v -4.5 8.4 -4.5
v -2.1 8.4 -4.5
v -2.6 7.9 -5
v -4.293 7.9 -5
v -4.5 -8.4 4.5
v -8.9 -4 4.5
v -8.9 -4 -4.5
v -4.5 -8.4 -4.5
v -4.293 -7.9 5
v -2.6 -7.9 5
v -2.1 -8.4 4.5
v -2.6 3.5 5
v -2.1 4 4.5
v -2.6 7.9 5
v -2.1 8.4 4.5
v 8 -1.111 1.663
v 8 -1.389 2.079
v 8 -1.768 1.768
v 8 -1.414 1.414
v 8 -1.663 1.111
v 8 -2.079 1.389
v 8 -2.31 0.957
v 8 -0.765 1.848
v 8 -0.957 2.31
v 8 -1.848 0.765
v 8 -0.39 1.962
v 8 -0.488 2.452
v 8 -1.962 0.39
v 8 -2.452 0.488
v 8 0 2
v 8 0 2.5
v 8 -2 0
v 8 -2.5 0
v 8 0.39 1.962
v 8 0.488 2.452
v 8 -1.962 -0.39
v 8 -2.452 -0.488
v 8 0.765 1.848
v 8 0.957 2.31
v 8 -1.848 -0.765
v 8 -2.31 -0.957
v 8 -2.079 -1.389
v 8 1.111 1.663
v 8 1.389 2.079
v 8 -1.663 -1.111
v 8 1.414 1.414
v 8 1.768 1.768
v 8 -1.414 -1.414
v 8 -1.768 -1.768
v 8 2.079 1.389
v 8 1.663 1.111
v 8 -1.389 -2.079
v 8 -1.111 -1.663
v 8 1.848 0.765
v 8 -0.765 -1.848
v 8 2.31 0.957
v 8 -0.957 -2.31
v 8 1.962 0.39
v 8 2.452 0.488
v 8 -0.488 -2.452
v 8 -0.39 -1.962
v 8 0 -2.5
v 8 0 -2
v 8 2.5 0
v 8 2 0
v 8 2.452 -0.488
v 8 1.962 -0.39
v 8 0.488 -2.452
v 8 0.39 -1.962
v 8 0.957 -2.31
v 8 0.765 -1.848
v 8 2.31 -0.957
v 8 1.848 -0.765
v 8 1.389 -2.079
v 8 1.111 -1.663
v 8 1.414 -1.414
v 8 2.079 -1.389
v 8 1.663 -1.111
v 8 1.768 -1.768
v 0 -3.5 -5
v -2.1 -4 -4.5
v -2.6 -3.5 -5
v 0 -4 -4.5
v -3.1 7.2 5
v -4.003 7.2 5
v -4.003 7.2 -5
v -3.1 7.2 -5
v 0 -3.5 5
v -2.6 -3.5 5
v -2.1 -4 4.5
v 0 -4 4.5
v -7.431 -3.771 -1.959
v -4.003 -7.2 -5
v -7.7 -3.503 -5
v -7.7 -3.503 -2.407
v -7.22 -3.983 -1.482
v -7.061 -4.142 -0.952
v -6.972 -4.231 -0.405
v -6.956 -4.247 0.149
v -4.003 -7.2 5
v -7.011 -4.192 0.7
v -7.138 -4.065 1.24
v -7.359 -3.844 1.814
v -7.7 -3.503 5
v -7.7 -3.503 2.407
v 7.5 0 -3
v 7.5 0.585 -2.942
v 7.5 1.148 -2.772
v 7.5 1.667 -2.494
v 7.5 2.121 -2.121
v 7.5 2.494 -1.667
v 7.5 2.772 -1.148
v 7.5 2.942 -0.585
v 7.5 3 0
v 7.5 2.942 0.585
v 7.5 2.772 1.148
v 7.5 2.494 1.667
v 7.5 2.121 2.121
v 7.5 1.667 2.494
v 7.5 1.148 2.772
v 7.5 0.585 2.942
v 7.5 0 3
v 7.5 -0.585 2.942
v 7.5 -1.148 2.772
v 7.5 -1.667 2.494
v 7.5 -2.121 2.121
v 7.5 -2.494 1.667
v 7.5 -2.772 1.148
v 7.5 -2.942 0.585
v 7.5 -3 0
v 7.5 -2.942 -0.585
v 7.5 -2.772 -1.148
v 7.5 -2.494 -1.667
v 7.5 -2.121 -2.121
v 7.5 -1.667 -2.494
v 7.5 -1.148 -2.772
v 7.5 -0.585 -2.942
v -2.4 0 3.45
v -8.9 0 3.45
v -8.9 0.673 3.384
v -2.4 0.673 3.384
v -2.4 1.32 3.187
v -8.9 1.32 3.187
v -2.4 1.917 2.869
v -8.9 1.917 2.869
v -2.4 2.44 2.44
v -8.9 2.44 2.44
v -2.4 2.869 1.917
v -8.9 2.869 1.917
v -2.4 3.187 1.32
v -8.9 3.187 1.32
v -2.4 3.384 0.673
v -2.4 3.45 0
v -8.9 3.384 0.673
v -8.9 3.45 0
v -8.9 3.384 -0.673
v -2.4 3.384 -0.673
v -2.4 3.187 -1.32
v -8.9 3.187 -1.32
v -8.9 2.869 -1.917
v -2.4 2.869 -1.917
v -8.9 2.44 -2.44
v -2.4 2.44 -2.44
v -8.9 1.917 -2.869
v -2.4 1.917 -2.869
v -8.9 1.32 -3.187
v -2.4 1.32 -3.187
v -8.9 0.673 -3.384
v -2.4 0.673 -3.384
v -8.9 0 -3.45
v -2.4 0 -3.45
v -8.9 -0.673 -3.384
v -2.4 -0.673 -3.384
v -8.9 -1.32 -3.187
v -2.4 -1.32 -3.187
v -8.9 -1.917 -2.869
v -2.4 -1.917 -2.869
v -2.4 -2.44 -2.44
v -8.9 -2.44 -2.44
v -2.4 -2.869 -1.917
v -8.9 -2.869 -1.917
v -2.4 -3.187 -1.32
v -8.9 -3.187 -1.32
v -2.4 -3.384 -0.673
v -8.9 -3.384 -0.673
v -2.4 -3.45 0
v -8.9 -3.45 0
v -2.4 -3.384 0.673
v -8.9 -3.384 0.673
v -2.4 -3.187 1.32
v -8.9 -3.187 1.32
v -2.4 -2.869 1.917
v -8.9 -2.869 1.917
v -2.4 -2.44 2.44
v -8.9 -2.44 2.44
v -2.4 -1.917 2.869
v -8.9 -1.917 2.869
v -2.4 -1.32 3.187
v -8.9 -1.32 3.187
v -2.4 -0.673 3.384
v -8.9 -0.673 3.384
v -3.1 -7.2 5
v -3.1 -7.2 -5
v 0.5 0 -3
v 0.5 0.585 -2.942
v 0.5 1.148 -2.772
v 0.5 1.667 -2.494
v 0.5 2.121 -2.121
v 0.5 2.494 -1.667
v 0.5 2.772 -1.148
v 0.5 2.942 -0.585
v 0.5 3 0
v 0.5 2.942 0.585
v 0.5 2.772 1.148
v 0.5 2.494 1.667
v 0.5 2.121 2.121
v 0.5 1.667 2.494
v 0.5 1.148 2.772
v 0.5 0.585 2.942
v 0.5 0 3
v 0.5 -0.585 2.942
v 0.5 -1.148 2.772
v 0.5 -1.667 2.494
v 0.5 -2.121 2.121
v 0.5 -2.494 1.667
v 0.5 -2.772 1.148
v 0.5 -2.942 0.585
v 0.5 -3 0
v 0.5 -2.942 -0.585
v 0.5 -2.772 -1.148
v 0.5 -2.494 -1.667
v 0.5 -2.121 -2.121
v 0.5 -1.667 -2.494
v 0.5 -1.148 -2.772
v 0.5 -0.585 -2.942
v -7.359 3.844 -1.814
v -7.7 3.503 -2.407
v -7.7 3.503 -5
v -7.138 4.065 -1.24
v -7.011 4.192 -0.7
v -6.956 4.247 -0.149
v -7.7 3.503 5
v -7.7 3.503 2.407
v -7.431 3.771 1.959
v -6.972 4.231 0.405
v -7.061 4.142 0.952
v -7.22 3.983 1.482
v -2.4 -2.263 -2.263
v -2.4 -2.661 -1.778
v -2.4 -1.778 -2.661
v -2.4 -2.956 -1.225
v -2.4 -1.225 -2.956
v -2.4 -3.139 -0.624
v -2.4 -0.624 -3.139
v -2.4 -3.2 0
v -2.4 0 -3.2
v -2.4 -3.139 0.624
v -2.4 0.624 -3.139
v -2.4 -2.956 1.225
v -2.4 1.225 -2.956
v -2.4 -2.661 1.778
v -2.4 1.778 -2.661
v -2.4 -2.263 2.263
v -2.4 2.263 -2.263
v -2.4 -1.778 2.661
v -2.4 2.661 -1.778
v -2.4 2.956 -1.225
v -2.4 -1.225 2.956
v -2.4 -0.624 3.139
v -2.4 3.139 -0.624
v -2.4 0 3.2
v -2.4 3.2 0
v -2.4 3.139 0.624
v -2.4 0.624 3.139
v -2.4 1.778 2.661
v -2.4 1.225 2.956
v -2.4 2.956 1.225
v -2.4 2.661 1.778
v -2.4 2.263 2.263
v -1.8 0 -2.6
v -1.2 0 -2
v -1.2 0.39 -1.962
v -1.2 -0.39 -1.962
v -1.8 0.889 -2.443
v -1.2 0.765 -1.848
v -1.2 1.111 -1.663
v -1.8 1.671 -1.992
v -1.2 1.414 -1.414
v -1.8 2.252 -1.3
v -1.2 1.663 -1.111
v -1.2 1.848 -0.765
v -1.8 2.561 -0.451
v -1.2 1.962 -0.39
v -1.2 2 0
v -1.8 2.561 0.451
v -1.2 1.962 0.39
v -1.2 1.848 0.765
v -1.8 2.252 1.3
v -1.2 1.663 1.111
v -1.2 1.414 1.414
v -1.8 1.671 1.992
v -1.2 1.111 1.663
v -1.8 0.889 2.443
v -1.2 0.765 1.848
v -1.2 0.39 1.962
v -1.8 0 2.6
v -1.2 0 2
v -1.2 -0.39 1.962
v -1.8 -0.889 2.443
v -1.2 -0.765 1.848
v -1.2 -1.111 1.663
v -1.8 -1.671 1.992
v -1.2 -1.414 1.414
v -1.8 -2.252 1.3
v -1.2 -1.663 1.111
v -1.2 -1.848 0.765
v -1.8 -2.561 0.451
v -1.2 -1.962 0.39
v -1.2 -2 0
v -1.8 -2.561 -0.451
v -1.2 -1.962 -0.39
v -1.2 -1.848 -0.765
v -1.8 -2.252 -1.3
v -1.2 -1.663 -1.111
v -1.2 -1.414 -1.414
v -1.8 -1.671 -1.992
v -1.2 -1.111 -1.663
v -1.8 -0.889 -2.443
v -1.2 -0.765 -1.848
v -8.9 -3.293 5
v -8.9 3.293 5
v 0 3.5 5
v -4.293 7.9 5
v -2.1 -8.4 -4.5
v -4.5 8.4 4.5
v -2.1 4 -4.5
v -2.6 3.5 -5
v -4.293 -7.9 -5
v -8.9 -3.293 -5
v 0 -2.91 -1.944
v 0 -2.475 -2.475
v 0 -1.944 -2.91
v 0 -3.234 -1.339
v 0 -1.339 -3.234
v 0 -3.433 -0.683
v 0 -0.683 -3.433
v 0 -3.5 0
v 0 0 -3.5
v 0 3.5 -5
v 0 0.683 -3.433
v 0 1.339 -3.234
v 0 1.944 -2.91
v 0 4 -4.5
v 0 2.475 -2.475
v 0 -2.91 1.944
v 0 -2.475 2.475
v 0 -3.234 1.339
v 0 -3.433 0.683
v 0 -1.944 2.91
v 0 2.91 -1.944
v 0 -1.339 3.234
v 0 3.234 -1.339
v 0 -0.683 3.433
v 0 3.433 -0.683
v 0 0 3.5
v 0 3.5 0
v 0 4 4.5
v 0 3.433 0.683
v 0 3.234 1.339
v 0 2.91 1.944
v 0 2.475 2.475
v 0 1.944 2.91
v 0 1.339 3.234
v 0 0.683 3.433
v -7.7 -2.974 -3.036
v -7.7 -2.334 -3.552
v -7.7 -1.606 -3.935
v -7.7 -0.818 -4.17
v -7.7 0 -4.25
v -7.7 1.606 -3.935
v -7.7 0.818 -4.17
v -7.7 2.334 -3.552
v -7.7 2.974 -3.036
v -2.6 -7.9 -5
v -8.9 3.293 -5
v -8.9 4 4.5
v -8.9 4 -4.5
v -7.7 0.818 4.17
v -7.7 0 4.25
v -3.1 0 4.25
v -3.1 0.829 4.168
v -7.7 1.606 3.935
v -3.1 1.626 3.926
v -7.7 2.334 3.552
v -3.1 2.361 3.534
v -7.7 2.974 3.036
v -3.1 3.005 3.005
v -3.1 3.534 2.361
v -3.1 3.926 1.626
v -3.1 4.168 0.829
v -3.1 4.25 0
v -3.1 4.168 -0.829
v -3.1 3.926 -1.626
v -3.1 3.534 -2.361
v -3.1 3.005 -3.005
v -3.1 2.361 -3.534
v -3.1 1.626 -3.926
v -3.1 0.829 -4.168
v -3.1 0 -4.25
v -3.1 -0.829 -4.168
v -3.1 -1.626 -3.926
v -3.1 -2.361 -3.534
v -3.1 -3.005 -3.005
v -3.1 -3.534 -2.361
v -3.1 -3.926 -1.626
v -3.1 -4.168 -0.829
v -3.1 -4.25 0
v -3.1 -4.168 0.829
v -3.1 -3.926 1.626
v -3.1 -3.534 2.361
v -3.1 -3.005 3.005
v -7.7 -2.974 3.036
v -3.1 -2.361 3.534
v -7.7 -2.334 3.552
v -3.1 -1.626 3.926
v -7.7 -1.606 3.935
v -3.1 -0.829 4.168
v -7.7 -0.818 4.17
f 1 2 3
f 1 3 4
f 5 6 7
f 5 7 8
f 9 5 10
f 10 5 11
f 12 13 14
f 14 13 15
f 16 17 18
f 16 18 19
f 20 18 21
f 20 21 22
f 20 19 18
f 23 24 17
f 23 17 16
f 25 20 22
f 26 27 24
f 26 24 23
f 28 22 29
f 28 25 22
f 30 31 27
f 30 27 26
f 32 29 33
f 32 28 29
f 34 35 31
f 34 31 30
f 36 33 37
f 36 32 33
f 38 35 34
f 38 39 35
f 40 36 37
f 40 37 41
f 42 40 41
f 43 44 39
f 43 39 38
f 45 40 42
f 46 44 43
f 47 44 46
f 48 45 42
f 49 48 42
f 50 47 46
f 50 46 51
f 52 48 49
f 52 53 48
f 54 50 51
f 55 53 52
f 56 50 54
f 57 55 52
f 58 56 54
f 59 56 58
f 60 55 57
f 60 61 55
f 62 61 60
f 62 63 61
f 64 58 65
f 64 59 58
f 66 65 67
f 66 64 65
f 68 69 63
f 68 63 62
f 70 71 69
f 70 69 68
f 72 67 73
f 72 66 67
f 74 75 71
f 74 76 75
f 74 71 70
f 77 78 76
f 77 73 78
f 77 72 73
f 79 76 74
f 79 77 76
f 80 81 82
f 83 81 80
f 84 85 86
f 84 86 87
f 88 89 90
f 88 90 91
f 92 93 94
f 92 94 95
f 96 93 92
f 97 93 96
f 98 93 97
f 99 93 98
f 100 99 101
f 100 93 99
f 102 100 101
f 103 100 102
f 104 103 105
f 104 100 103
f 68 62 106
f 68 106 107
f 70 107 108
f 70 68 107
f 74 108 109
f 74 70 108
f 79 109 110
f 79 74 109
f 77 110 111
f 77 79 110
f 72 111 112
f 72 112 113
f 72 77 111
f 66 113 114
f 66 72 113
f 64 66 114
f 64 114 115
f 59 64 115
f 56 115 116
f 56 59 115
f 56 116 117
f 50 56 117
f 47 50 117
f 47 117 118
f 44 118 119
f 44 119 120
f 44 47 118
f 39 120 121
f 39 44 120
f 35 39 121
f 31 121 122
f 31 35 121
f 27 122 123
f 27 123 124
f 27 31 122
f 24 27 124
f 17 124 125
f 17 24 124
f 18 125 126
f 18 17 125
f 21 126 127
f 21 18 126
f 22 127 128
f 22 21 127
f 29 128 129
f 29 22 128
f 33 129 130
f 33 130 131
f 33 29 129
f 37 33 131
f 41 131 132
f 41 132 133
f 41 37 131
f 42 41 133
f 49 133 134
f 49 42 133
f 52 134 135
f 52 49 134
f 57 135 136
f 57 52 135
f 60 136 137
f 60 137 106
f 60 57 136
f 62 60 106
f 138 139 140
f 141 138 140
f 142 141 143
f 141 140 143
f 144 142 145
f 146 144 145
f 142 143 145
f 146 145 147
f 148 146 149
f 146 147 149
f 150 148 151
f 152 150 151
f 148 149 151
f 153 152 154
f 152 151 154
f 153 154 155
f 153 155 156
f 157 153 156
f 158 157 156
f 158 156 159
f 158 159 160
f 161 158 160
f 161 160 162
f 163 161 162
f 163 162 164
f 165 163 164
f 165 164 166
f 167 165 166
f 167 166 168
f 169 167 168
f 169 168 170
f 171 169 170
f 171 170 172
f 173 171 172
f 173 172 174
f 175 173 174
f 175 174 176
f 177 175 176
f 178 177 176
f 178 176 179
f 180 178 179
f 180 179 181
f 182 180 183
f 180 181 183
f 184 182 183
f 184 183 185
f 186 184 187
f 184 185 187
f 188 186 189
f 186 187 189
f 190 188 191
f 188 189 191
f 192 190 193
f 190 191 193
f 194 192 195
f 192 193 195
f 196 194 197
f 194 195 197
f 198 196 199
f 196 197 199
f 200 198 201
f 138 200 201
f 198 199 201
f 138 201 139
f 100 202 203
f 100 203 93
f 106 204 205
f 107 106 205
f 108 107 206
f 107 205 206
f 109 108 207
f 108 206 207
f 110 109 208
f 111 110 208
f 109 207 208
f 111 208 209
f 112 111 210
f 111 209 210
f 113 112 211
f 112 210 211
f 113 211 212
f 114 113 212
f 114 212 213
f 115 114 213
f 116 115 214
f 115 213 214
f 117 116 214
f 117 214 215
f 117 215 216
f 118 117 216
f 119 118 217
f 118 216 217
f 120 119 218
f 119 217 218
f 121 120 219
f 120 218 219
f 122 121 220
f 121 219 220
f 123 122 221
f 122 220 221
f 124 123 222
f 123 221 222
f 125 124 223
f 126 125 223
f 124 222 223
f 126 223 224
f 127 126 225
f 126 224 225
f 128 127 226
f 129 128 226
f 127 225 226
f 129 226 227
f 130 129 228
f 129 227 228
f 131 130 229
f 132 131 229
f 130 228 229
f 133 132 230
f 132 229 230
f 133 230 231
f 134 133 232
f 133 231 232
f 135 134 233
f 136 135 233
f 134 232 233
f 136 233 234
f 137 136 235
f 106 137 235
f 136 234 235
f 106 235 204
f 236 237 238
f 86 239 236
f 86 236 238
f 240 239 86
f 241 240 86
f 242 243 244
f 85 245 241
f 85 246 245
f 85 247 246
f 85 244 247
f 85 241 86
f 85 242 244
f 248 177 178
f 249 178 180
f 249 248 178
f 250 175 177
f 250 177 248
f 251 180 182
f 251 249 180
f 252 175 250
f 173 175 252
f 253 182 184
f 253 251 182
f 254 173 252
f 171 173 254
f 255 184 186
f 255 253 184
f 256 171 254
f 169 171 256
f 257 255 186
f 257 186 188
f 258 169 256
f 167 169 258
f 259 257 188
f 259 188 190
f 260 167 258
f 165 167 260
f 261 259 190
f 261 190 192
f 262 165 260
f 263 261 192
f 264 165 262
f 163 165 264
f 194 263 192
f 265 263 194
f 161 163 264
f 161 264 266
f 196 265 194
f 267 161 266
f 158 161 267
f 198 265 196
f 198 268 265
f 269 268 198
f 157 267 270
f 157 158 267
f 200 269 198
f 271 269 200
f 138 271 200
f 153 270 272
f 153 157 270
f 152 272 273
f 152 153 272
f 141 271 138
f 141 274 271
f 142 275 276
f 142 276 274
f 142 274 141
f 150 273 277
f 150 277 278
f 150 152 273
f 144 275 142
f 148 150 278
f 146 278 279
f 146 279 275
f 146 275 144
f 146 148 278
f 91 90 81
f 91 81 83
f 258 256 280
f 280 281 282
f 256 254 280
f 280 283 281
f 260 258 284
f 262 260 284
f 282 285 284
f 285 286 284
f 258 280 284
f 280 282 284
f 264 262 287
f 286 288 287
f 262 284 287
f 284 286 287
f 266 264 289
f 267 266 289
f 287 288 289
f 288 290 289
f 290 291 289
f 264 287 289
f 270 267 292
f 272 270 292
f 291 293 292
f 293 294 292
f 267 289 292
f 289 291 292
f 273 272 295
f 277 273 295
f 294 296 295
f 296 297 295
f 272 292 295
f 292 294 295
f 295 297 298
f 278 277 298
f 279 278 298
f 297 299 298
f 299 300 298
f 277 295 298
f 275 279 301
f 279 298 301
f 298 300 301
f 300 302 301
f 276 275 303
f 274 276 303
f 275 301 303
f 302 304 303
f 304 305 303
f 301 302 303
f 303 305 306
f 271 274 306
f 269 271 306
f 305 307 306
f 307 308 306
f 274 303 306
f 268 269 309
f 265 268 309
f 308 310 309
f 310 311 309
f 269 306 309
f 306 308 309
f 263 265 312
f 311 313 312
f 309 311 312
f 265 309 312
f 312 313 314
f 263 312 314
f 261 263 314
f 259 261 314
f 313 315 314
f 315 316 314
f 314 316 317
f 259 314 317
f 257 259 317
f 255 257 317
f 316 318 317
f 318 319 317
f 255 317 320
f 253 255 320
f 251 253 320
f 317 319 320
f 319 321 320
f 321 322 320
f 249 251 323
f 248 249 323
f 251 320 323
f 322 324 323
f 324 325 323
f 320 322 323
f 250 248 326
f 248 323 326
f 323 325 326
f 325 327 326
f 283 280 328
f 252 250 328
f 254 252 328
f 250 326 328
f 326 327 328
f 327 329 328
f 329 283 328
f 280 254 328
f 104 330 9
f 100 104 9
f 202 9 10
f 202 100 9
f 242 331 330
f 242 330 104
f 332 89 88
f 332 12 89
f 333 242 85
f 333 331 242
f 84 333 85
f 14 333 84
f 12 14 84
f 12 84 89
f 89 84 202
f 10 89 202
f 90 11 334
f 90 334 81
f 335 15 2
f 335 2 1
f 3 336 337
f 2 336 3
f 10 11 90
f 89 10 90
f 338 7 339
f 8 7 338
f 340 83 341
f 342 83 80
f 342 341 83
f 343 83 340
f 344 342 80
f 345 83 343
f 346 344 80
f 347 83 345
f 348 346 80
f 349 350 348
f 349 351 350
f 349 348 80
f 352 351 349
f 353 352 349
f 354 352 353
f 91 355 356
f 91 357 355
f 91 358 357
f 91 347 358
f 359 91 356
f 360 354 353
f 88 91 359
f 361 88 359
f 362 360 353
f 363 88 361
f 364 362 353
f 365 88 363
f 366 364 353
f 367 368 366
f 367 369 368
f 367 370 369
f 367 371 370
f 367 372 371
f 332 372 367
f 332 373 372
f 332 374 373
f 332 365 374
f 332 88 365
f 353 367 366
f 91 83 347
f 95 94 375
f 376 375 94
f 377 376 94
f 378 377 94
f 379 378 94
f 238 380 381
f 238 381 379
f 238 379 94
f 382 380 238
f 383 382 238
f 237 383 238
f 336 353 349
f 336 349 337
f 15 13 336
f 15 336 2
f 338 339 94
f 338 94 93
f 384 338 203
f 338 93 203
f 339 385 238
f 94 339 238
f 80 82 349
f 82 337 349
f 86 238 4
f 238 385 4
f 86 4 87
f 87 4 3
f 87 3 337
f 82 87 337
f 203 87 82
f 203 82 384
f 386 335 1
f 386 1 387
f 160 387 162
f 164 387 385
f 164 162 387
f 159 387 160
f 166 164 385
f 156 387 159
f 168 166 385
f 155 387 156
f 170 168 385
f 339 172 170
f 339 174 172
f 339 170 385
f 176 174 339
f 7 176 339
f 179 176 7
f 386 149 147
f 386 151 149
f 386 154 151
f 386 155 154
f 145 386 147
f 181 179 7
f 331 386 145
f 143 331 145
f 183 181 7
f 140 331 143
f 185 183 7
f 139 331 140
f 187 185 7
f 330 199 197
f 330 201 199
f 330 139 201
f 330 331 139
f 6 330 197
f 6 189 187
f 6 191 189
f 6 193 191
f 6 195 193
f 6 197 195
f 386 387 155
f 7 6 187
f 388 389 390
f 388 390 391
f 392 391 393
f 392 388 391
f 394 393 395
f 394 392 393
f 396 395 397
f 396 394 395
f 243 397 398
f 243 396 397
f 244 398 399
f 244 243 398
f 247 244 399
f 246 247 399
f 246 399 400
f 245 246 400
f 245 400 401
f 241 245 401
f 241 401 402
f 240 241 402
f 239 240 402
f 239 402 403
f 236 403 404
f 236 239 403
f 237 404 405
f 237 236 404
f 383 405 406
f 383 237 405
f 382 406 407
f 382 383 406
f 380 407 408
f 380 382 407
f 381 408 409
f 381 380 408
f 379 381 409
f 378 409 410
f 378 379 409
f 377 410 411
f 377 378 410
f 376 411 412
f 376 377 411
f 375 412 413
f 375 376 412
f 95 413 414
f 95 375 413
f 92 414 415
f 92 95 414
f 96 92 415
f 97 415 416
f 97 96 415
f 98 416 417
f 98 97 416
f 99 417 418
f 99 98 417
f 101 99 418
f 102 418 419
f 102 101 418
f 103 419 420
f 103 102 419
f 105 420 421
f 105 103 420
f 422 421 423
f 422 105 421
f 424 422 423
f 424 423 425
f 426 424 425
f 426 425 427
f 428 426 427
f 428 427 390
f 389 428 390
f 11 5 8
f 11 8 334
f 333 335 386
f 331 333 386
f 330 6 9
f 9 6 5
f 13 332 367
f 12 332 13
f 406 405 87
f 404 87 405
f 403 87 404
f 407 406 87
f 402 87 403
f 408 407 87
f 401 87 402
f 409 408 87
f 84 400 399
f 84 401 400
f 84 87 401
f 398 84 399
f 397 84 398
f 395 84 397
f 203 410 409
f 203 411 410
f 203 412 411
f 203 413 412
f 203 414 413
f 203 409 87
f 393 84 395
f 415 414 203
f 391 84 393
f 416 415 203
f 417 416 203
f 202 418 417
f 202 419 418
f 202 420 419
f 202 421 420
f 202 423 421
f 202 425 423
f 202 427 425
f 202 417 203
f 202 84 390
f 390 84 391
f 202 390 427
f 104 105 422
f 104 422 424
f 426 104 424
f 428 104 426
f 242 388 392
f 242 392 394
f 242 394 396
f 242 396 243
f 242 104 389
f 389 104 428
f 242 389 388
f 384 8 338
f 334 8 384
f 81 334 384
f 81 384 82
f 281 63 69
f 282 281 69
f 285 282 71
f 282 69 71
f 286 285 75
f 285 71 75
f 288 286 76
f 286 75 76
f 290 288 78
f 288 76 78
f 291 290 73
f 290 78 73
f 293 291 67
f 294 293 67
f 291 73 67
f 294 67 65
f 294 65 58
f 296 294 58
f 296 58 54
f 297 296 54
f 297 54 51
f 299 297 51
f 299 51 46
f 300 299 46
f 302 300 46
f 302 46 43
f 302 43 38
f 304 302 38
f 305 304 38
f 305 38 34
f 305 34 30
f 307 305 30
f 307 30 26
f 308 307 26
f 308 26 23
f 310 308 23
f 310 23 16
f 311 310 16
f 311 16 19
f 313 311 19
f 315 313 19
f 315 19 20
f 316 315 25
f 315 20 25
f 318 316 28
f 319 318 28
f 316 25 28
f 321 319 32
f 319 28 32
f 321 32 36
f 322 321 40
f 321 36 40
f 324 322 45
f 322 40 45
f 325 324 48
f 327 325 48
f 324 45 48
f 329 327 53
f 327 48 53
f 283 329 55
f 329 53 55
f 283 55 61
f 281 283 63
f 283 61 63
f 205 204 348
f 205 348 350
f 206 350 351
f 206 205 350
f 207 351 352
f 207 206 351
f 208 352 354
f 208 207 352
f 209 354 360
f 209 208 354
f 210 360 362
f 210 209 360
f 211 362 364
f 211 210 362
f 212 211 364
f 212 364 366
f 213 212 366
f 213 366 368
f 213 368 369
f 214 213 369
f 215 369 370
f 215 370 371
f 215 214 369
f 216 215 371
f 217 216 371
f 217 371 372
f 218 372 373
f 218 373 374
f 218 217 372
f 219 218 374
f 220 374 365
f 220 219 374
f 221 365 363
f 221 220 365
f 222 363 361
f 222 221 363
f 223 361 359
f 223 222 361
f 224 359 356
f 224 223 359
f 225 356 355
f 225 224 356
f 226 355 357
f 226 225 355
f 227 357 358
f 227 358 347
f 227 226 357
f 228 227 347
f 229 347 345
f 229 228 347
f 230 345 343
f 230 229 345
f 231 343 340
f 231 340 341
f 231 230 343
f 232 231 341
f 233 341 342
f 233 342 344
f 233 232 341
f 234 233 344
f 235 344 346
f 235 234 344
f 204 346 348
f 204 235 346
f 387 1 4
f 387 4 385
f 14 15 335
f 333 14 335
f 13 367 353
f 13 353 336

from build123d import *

# Parameters (mm, degrees)
SALIENTE_EXTRUIR1_DEPTH = 5
CROQUIS2_R              = 3
SALIENTE_EXTRUIR2_DEPTH = 8
CHAFL_N1_SIZE           = 0.5
CROQUIS3_R              = 2
CORTAR_EXTRUIR1_DEPTH   = 17.9
CROQUIS4_R              = 3.45
CORTAR_EXTRUIR2_DEPTH   = 6.5
CORTAR_EXTRUIR3_DEPTH   = 11
CHAFL_N2_SIZE           = 0.5
CHAFL_N3_SIZE           = 1.2
SALIENTE_EXTRUIR3_START = -1
CROQUIS6_R              = 4.25
CROQUIS6_R_2            = 3.45
SALIENTE_EXTRUIR3_DEPTH = 4.8


with BuildPart() as part:
    # Croquis1 → Saliente-Extruir1 (new body, symmetric)
    with BuildSketch(Plane.XY):
        Polygon((0, 4), (-2.1, 4), (-2.1, 8.4), (-4.5, 8.4), (-8.9, 4), (-8.9, -4), (-4.5, -8.4), (-2.1, -8.4), (-2.1, -4), (0, -4), align=None)
    extrude(amount=SALIENTE_EXTRUIR1_DEPTH, both=True)

    # Croquis2 → Saliente-Extruir2 (add)
    with BuildSketch(Plane(origin=(0, 0, 0), x_dir=(0, 0, -1), z_dir=(1, 0, 0))):
        Circle(CROQUIS2_R)
    extrude(amount=SALIENTE_EXTRUIR2_DEPTH)

    # Chaflán1
    chafl_n1_edges = [part.edges().sort_by_distance(p)[0] for p in [
        (0, 0, 3),
        (8, 0, 3),
    ]]
    chamfer(chafl_n1_edges, length=CHAFL_N1_SIZE)

    # Croquis3 → Cortar-Extruir1 (cut, through all)
    with BuildSketch(Plane(origin=(8, 0, 0), x_dir=(0, 0, -1), z_dir=(1, 0, 0))):
        Circle(CROQUIS3_R)
    extrude(amount=-CORTAR_EXTRUIR1_DEPTH, mode=Mode.SUBTRACT)

    # Croquis4 → Cortar-Extruir2 (cut)
    with BuildSketch(Plane.ZY.offset(8.9)):
        Circle(CROQUIS4_R)
    extrude(amount=-CORTAR_EXTRUIR2_DEPTH, mode=Mode.SUBTRACT)

    # Croquis5 → Cortar-Extruir3 (cut, through all)
    with BuildSketch(Plane.XY.offset(5)):
        Polygon((-3.1, 7.2), (-3.1, -7.2), (-4.002943725, -7.2), (-7.7, -3.502943725), (-7.7, 3.502943725), (-4.002943725, 7.2), align=None)
    extrude(amount=-CORTAR_EXTRUIR3_DEPTH, mode=Mode.SUBTRACT)

    # Chaflán2
    chafl_n2_edges = [part.edges().sort_by_distance(p)[0] for p in [
        (-1.05, -4, -5),
        (-2.1, -6.2, -5),
        (-3.3, -8.4, -5),
        (-6.7, -6.2, -5),
        (-6.7, 6.2, -5),
        (-3.3, 8.4, -5),
        (-2.1, 6.2, 5),
        (-2.1, 6.2, -5),
        (-1.05, 4, -5),
        (-3.3, 8.4, 5),
        (-6.7, 6.2, 5),
        (-6.7, -6.2, 5),
        (-3.3, -8.4, 5),
        (-2.1, -6.2, 5),
        (-1.05, -4, 5),
        (-1.05, 4, 5),
    ]]
    chamfer(chafl_n2_edges, length=CHAFL_N2_SIZE)

    # Chaflán3
    chafl_n3_edges = [part.edges().sort_by_distance(p)[0] for p in [
        (-2.4, 0, 2),
    ]]
    chamfer(chafl_n3_edges, length=CHAFL_N3_SIZE)

    # Croquis6 → Saliente-Extruir3 (add)
    with BuildSketch(Plane.ZY.offset(8.9).offset(SALIENTE_EXTRUIR3_START)):
        Circle(CROQUIS6_R)
        Circle(CROQUIS6_R_2, mode=Mode.SUBTRACT)
    extrude(amount=-SALIENTE_EXTRUIR3_DEPTH)


solid = part.part
